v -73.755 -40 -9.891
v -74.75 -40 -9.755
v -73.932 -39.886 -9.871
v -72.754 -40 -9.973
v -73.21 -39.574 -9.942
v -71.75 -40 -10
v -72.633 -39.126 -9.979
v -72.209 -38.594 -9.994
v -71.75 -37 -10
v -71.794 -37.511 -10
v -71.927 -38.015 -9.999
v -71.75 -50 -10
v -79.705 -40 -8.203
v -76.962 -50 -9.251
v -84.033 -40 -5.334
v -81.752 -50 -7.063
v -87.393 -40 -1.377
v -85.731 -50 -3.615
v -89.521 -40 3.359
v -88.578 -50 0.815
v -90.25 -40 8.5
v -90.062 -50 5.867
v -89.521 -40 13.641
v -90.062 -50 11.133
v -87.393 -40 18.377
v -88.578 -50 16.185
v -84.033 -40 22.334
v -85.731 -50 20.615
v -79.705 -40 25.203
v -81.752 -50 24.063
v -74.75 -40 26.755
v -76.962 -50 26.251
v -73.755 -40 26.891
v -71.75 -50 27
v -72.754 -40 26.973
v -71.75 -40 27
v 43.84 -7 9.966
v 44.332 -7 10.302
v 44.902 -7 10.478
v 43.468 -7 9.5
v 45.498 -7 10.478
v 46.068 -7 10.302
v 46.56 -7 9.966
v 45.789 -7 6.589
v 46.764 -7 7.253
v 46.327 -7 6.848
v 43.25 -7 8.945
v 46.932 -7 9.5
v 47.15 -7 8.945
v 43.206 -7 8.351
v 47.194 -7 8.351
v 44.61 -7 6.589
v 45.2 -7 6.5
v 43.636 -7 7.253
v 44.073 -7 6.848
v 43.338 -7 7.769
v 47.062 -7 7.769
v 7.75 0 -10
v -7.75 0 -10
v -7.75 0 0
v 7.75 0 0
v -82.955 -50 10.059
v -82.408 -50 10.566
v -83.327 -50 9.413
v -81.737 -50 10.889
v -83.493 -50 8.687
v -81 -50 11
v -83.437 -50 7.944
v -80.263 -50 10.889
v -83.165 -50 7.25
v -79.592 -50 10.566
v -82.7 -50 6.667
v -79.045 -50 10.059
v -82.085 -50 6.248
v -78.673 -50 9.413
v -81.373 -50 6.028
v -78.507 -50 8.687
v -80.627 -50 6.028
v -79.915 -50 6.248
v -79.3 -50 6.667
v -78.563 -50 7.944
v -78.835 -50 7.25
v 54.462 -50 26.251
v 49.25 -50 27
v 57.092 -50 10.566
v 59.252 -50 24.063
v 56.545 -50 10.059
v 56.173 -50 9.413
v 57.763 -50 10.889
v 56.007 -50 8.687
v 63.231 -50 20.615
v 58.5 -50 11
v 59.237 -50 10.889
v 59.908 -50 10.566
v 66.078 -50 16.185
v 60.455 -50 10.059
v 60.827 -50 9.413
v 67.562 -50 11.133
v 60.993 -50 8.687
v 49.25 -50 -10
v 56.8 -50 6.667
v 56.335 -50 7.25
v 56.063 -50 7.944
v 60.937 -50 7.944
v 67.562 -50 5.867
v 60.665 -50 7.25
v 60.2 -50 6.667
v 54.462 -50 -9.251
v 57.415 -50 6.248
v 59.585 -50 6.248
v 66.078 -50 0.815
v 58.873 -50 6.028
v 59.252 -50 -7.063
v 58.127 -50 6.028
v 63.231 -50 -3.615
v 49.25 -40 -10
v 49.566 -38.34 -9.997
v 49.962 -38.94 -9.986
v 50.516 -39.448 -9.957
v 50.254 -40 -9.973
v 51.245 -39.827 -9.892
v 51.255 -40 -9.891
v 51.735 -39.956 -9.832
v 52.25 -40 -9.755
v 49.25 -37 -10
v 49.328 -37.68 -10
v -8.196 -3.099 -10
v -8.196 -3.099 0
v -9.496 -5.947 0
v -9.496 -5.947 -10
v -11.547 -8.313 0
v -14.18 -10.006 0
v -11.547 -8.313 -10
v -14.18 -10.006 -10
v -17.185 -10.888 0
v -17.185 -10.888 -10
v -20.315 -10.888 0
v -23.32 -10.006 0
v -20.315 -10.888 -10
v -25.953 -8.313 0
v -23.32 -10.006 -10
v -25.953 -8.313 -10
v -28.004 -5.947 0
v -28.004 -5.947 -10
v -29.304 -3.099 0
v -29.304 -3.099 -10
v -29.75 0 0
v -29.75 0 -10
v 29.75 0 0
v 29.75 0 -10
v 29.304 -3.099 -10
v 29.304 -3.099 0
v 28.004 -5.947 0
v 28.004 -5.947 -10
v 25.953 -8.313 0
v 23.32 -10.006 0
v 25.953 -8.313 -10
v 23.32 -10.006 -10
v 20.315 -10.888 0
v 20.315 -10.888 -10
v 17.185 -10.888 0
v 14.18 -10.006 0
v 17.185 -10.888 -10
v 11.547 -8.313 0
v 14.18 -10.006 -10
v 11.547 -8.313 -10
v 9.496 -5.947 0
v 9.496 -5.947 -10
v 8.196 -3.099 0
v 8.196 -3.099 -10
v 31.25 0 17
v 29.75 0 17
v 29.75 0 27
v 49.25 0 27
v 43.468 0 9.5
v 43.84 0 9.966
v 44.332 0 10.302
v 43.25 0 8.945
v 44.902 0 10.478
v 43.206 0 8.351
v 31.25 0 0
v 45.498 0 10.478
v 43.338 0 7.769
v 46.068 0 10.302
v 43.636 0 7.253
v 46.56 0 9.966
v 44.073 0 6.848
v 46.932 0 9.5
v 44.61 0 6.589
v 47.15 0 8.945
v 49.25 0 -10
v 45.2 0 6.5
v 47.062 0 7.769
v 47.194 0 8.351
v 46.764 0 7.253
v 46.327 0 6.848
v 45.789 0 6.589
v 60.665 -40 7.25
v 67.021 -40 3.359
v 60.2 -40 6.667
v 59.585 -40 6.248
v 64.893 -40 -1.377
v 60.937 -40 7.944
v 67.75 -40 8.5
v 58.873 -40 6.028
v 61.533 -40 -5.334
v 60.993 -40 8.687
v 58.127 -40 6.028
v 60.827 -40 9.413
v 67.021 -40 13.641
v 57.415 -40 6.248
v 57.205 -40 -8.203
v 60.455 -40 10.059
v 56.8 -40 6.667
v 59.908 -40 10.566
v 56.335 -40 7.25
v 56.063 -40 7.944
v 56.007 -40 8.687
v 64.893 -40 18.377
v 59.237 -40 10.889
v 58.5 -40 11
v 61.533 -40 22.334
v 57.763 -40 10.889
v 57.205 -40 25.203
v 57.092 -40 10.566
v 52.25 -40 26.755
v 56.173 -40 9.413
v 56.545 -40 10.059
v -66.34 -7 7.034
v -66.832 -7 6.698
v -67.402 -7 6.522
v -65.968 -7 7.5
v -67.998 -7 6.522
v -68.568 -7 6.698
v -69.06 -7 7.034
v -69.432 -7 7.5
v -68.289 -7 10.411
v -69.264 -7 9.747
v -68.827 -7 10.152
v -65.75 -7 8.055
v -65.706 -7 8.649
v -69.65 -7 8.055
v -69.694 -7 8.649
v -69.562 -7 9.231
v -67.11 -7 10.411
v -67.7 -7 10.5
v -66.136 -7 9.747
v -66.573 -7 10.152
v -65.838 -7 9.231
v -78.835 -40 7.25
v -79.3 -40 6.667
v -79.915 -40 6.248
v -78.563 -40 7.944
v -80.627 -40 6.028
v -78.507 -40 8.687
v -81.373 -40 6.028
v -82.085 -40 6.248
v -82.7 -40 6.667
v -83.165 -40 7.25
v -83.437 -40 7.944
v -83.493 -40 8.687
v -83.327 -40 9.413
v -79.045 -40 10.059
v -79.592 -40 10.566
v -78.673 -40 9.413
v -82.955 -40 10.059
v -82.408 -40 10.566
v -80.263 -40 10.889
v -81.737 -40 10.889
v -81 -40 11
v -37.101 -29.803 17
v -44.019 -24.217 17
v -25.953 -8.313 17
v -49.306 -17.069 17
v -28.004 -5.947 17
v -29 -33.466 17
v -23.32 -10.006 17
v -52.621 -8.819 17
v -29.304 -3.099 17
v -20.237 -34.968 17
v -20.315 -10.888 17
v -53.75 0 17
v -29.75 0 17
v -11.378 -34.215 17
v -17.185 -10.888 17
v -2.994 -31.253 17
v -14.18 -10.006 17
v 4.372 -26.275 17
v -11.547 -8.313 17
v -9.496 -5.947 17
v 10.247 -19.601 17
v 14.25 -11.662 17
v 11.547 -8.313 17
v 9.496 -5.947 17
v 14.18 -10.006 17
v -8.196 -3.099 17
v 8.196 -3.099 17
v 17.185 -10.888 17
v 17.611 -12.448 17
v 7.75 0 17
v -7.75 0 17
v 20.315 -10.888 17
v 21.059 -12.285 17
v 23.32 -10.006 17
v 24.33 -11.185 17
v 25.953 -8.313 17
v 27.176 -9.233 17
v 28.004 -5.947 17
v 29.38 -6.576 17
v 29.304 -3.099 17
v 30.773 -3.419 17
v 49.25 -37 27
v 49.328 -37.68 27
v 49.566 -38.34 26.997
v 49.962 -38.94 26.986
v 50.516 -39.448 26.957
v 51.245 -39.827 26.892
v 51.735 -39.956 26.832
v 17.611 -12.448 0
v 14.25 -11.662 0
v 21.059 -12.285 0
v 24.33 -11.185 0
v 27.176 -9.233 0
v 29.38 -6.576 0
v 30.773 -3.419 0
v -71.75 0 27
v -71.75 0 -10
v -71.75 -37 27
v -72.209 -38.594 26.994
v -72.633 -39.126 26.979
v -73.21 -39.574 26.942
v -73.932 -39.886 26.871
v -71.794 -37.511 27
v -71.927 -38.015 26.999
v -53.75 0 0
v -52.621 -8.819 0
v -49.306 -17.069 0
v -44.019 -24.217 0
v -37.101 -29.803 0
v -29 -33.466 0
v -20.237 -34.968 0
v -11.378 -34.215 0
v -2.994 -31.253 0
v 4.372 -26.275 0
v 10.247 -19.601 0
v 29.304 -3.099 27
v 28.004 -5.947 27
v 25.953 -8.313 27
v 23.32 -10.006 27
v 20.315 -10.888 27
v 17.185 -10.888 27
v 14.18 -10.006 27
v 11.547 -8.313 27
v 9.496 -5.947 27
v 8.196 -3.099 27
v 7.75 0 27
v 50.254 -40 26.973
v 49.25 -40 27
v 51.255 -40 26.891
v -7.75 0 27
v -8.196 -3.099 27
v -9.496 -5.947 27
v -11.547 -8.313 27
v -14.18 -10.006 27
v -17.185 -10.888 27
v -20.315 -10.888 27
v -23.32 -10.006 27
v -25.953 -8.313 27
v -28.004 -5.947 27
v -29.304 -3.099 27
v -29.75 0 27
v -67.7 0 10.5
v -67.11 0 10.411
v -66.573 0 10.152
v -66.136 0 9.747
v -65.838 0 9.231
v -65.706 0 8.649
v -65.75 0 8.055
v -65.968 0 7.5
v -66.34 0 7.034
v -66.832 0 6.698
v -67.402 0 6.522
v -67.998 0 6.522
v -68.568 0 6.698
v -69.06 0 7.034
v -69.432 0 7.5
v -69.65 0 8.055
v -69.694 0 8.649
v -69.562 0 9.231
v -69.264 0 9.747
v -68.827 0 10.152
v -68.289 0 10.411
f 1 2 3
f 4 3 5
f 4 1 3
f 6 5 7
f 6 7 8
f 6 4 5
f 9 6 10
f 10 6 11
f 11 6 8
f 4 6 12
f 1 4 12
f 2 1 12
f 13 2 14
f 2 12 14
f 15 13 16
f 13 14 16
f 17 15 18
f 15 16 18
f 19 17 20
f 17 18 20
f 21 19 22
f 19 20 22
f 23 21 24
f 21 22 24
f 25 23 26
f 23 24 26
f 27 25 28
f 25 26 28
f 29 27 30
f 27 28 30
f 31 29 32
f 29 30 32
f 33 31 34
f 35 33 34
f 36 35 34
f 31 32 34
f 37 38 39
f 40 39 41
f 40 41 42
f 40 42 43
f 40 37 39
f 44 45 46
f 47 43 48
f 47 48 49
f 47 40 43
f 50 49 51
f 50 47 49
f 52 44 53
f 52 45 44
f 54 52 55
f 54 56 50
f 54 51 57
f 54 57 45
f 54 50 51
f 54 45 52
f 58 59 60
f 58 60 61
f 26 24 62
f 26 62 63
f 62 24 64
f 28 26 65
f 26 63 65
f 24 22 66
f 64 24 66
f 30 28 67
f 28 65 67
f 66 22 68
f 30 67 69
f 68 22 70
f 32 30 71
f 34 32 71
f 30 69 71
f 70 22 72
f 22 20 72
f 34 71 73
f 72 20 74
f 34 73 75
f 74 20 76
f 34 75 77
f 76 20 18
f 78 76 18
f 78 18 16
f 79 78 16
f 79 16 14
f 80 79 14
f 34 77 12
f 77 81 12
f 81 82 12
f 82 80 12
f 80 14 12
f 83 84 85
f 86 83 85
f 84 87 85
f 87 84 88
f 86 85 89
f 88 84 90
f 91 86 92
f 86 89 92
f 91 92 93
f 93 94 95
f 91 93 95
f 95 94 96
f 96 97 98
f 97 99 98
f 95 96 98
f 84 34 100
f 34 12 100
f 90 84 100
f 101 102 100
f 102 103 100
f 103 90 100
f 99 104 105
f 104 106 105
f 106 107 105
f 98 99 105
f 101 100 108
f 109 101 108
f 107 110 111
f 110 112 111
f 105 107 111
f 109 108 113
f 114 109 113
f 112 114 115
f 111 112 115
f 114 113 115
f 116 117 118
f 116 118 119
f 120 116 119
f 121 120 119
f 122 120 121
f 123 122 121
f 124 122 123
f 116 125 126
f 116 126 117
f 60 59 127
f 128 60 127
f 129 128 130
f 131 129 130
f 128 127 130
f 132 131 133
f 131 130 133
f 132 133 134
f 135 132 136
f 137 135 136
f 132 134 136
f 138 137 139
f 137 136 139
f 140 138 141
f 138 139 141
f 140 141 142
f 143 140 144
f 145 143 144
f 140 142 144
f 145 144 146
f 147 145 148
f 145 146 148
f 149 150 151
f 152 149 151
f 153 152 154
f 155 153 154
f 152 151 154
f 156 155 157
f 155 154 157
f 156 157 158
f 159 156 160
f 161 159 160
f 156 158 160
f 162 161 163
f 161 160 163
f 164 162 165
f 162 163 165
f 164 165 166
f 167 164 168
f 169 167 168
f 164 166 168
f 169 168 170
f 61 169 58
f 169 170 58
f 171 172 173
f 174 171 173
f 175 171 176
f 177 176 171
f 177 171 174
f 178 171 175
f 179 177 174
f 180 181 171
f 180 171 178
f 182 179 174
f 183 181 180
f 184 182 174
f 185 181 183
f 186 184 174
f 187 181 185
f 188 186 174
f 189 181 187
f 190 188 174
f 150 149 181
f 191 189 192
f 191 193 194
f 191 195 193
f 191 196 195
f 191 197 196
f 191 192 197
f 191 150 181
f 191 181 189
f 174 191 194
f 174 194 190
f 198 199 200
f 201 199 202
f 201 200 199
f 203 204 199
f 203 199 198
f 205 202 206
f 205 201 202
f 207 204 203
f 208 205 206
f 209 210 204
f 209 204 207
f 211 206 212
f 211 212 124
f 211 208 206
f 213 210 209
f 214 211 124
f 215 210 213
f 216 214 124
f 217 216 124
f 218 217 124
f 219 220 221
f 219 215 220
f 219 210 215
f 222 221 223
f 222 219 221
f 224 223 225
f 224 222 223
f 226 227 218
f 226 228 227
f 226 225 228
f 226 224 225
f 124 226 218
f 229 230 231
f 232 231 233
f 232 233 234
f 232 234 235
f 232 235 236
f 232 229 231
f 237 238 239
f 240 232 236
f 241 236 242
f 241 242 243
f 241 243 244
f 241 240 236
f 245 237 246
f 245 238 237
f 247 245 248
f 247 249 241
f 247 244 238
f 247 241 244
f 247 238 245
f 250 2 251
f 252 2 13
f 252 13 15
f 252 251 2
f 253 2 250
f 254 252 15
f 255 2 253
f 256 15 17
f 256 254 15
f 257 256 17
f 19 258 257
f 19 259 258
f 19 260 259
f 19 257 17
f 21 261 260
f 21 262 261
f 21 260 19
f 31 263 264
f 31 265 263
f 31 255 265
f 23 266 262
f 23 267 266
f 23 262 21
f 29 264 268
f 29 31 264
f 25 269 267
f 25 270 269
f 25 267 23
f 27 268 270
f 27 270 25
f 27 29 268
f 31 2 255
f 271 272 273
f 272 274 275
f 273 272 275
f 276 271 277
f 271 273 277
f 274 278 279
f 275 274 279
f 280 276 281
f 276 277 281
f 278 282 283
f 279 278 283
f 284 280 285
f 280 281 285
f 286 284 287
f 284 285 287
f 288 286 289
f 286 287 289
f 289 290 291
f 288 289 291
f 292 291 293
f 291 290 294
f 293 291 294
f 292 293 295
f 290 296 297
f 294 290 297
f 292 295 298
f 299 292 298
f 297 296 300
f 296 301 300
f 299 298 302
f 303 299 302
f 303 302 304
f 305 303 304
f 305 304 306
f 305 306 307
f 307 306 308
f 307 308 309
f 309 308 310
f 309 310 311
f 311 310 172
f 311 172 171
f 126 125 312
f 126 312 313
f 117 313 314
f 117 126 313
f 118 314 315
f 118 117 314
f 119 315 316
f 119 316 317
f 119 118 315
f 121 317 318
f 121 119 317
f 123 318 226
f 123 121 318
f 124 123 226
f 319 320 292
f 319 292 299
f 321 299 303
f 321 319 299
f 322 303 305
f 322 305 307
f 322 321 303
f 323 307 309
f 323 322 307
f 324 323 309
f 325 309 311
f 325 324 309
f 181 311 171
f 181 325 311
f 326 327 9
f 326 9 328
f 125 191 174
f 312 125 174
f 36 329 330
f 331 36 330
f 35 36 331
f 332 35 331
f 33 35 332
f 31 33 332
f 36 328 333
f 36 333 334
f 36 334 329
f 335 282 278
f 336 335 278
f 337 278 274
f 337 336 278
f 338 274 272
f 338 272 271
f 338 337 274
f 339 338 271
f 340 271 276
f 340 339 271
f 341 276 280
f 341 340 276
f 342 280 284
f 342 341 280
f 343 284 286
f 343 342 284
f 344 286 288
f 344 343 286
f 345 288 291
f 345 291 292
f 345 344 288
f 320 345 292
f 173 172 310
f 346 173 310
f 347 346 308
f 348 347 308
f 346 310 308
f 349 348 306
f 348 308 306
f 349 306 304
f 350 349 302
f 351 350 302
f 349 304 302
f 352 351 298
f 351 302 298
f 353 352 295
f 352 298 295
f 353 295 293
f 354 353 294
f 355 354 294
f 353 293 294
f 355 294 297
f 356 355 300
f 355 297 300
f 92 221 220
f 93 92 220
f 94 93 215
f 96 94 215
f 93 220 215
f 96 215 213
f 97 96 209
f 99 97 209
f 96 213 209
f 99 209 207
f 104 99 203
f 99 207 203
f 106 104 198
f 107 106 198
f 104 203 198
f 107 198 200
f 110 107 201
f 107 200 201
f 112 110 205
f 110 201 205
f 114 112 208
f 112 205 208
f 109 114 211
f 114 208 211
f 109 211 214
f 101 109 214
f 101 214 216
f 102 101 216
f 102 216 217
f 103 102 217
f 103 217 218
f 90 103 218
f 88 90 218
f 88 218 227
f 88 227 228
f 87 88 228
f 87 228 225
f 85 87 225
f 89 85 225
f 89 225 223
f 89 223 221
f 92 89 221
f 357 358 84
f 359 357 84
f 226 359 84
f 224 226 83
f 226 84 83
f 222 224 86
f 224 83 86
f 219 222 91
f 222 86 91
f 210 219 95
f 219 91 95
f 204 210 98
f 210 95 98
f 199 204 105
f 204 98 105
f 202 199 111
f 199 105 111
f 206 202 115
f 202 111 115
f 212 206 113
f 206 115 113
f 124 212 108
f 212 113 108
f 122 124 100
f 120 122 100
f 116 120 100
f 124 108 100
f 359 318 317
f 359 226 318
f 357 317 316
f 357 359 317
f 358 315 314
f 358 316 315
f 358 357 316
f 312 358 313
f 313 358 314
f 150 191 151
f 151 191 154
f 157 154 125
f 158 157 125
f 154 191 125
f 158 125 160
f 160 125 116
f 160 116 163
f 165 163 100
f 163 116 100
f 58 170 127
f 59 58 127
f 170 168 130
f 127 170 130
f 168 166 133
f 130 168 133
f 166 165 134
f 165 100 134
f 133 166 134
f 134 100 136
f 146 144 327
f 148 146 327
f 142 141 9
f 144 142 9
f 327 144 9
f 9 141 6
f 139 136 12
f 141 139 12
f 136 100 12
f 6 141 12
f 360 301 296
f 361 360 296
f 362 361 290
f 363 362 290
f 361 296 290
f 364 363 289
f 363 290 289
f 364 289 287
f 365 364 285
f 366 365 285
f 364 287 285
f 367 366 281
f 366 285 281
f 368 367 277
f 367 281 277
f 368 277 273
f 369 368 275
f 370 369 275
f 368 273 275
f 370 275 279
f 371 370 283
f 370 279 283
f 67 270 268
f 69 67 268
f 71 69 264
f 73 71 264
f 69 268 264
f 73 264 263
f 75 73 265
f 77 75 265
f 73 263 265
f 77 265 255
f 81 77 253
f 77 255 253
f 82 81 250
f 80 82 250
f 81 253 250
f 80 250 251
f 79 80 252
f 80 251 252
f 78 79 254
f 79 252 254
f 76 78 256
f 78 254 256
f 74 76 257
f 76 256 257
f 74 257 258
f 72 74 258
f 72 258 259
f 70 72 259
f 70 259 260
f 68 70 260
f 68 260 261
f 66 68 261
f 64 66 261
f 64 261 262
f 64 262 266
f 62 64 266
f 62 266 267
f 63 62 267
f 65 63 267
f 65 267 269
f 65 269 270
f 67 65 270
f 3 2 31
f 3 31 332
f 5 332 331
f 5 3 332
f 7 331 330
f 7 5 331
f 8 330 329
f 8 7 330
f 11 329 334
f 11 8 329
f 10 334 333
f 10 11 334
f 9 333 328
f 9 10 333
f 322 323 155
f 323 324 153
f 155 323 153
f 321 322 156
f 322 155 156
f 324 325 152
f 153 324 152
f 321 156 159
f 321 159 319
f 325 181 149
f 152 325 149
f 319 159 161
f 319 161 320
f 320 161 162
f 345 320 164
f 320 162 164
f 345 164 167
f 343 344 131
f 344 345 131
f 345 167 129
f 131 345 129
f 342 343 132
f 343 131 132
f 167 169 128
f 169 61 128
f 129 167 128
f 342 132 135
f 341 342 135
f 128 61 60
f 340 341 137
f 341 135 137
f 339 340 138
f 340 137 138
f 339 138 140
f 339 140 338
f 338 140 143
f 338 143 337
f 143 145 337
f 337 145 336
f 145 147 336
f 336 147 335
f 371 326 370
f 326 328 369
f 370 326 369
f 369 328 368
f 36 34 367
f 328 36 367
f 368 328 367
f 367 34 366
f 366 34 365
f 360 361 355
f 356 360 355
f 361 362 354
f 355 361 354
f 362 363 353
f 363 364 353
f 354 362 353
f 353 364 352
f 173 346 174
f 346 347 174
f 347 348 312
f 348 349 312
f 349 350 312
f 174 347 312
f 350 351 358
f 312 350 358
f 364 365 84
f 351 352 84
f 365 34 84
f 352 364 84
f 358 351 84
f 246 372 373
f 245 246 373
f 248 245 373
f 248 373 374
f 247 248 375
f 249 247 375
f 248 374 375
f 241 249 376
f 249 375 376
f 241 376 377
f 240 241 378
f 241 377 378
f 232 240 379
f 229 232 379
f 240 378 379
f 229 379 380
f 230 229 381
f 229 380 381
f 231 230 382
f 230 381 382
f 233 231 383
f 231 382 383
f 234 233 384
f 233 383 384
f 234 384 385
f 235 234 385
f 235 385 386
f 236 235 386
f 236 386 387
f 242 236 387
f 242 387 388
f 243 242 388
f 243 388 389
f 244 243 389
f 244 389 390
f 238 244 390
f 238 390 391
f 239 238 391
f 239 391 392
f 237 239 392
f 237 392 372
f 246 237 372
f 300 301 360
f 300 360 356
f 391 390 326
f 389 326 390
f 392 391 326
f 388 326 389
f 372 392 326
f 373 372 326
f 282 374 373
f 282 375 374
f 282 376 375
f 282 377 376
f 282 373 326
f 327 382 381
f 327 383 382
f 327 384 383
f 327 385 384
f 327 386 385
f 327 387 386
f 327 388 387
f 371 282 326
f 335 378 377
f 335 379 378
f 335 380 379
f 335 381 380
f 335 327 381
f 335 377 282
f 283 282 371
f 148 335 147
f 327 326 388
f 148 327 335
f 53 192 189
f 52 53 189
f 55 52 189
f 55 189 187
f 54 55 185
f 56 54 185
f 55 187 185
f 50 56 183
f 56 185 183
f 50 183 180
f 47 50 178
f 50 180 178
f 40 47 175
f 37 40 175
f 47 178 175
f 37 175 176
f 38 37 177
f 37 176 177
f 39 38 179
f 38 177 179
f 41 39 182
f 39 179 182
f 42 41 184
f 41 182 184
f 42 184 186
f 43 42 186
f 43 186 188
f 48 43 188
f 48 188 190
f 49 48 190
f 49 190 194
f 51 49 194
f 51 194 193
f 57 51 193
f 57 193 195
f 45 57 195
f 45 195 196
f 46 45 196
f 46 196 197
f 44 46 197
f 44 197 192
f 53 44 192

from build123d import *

# Parameters (mm, degrees)
BOSS_EXTRUDE2_DEPTH      = 27
SHELL5_DEPTH             = 17
BOSS_EXTRUDE3_START      = 10
BOSS_EXTRUDE3_DEPTH      = 10
SKETCH5_R                = 11
CUT_EXTRUDE2_DEPTH       = 87.360074687
BOSS_EXTRUDE4_DEPTH      = 37
BOSS_EXTRUDE5_DEPTH      = 3
BOSS_EXTRUDE5_DEPTH_BACK = 50
SKETCH10_R               = 2
CUT_EXTRUDE3_DEPTH       = 10
SKETCH11_W               = 121
SKETCH11_H               = 37
CUT_EXTRUDE4_DEPTH       = 92.526294036
BOSS_EXTRUDE6_DEPTH      = 10
FILLET1_R                = 3
SKETCH13_R               = 2.5
CUT_EXTRUDE5_DEPTH       = 103.342867477


# Read off the part's stored shape, not the designer's step: Shell5
with BuildPart() as part:
    # Sketch1 → Boss-Extrude2 (new body)
    with BuildSketch(Plane.XY):
        with BuildLine():
            ThreePointArc((20.25, 22.449944321), (-63.75, 0), (20.25, -22.449944321))
            ThreePointArc((20.25, -22.449944321), (41.25, 0), (20.25, 22.449944321))
        make_face()
    extrude(amount=BOSS_EXTRUDE2_DEPTH)

    # Shell5 outline → Shell5 (cut)
    with BuildSketch(Plane.XY):
        with BuildLine():
            ThreePointArc((14.25, -11.66190379), (31.25, 0), (14.25, 11.66190379))
            ThreePointArc((14.25, 11.66190379), (-53.75, 0), (14.25, -11.66190379))
        make_face()
    extrude(amount=SHELL5_DEPTH, mode=Mode.SUBTRACT)

    # Sketch4 → Boss-Extrude3 (add)
    with BuildSketch(Plane(origin=(0, 0, 0), x_dir=(-1, 0, 0), z_dir=(0, 0, -1)).offset(BOSS_EXTRUDE3_START)):
        with BuildLine():
            ThreePointArc((-20.25, 22.449944321), (-41.25, 0), (-20.25, -22.449944321))
            ThreePointArc((-20.25, -22.449944321), (63.75, 0), (-20.25, 22.449944321))
        make_face()
    extrude(amount=-BOSS_EXTRUDE3_DEPTH)

    # Sketch5 → Cut-Extrude2 (cut, through all)
    with BuildSketch(Plane(origin=(0, 0, -10), x_dir=(-1, 0, 0), z_dir=(0, 0, -1))):
        with Locations((-18.75, 0)):
            Circle(SKETCH5_R)
        with Locations((18.75, 0)):
            Circle(SKETCH5_R)
    extrude(amount=-CUT_EXTRUDE2_DEPTH, mode=Mode.SUBTRACT)

    # Sketch8 → Boss-Extrude4 (add)
    with BuildSketch(Plane(origin=(0, 0, -10), x_dir=(-1, 0, 0), z_dir=(0, 0, -1))):
        with BuildLine():
            Line((-41.25, 0), (-41.25, -50))
            Line((-41.25, -50), (63.75, -50))
            Line((63.75, -50), (63.75, 0))
            ThreePointArc((63.75, 0), (30.368950039, -43.474130239), (-20.25, -22.449944321))
            ThreePointArc((-20.25, -22.449944321), (-35.181676725, -15.370426149), (-41.25, 0))
        make_face()
    extrude(amount=-BOSS_EXTRUDE4_DEPTH)

    # Sketch9 → Boss-Extrude5 (add, two sides: drawn at the far end of the back side and taken through both)
    with BuildSketch(Plane(origin=(0, 0, 0), x_dir=(1, 0, 0), z_dir=(0, 1, 0)).offset(-BOSS_EXTRUDE5_DEPTH_BACK)):
        Polygon((-71.75, -27), (-58.75, -27), (-58.75, -8.5), (-58.75, 10), (-71.75, 10), align=None)
        Polygon((36.25, -8.5), (36.25, 10), (49.25, 10), (49.25, -27), (36.25, -27), align=None)
    extrude(amount=BOSS_EXTRUDE5_DEPTH + BOSS_EXTRUDE5_DEPTH_BACK)

    # Sketch10 → Cut-Extrude3 (cut)
    with BuildSketch(Plane(origin=(0, 3, 0), x_dir=(1, 0, 0), z_dir=(0, 1, 0))):
        with Locations(Location((-67.699944321, -8.5, 0), (0, 0, 270))):
            Circle(SKETCH10_R)
        with Locations(Location((45.199944321, -8.5, 0), (0, 0, 90))):
            Circle(SKETCH10_R)
    extrude(amount=-CUT_EXTRUDE3_DEPTH, mode=Mode.SUBTRACT)

    # Sketch11 → Cut-Extrude4 (cut, through all)
    with BuildSketch(Plane(origin=(0, 0, 0), x_dir=(1, 0, 0), z_dir=(0, 1, 0))):
        with Locations((-11.25, -8.5)):
            Rectangle(SKETCH11_W, SKETCH11_H)
    extrude(amount=CUT_EXTRUDE4_DEPTH, mode=Mode.SUBTRACT)

    # Sketch12 → Boss-Extrude6 (add)
    with BuildSketch(Plane.XZ.offset(50)):
        with BuildLine():
            Line((-71.75, 27), (49.25, 27))
            ThreePointArc((49.25, 27), (67.75, 8.5), (49.25, -10))
            Line((49.25, -10), (-71.75, -10))
            ThreePointArc((-71.75, -10), (-90.25, 8.5), (-71.75, 27))
        make_face()
    extrude(amount=-BOSS_EXTRUDE6_DEPTH)

    # Fillet1
    # the kernel refuses this fillet: 3 mm, written as the material it adds along each edge
    with BuildSketch(Plane(origin=(49.25, -40, -17.5), x_dir=(0, 1, 0), z_dir=(0, 0, 1))) as fillet1_piece_1_section:
        with BuildLine():
            CenterArc((FILLET1_R, -FILLET1_R), FILLET1_R, 90, 90)
            Line((0, -FILLET1_R), (0, 0))
            Line((0, 0), (FILLET1_R, 0))
        make_face()
    fillet1_piece_1 = extrude(amount=52, mode=Mode.PRIVATE)
    fillet1_piece_1 = fillet1_piece_1 & Plane(origin=(49.25, -39.329436552, 8.5), x_dir=(0, 0, 1), z_dir=(0, -1, 0)) * Cylinder(18.5, 116, mode=Mode.PRIVATE)
    add(fillet1_piece_1)
    with BuildSketch(Plane(origin=(-71.75, -40, -17.5), x_dir=(0, 1, 0), z_dir=(0, 0, 1))) as fillet1_piece_2_section:
        with BuildLine():
            CenterArc((FILLET1_R, FILLET1_R), FILLET1_R, 180, 90)
            Line((0, FILLET1_R), (0, 0))
            Line((0, 0), (FILLET1_R, 0))
        make_face()
    fillet1_piece_2 = extrude(amount=52, mode=Mode.PRIVATE)
    fillet1_piece_2 = fillet1_piece_2 & Plane(origin=(-71.75, -39.329436515, 8.5), x_dir=(0, 0, -1), z_dir=(0, -1, 0)) * Cylinder(18.5, 116, mode=Mode.PRIVATE)
    add(fillet1_piece_2)

    # Sketch13 → Cut-Extrude5 (cut, through all)
    with BuildSketch(Plane(origin=(0, -40, 0), x_dir=(1, 0, 0), z_dir=(0, 1, 0))):
        with Locations(Location((-81, -8.5, 0), (0, 0, 270))):
            Circle(SKETCH13_R)
        with Locations(Location((58.5, -8.5, 0), (0, 0, 270))):
            Circle(SKETCH13_R)
    extrude(amount=-CUT_EXTRUDE5_DEPTH, mode=Mode.SUBTRACT)


solid = part.part
